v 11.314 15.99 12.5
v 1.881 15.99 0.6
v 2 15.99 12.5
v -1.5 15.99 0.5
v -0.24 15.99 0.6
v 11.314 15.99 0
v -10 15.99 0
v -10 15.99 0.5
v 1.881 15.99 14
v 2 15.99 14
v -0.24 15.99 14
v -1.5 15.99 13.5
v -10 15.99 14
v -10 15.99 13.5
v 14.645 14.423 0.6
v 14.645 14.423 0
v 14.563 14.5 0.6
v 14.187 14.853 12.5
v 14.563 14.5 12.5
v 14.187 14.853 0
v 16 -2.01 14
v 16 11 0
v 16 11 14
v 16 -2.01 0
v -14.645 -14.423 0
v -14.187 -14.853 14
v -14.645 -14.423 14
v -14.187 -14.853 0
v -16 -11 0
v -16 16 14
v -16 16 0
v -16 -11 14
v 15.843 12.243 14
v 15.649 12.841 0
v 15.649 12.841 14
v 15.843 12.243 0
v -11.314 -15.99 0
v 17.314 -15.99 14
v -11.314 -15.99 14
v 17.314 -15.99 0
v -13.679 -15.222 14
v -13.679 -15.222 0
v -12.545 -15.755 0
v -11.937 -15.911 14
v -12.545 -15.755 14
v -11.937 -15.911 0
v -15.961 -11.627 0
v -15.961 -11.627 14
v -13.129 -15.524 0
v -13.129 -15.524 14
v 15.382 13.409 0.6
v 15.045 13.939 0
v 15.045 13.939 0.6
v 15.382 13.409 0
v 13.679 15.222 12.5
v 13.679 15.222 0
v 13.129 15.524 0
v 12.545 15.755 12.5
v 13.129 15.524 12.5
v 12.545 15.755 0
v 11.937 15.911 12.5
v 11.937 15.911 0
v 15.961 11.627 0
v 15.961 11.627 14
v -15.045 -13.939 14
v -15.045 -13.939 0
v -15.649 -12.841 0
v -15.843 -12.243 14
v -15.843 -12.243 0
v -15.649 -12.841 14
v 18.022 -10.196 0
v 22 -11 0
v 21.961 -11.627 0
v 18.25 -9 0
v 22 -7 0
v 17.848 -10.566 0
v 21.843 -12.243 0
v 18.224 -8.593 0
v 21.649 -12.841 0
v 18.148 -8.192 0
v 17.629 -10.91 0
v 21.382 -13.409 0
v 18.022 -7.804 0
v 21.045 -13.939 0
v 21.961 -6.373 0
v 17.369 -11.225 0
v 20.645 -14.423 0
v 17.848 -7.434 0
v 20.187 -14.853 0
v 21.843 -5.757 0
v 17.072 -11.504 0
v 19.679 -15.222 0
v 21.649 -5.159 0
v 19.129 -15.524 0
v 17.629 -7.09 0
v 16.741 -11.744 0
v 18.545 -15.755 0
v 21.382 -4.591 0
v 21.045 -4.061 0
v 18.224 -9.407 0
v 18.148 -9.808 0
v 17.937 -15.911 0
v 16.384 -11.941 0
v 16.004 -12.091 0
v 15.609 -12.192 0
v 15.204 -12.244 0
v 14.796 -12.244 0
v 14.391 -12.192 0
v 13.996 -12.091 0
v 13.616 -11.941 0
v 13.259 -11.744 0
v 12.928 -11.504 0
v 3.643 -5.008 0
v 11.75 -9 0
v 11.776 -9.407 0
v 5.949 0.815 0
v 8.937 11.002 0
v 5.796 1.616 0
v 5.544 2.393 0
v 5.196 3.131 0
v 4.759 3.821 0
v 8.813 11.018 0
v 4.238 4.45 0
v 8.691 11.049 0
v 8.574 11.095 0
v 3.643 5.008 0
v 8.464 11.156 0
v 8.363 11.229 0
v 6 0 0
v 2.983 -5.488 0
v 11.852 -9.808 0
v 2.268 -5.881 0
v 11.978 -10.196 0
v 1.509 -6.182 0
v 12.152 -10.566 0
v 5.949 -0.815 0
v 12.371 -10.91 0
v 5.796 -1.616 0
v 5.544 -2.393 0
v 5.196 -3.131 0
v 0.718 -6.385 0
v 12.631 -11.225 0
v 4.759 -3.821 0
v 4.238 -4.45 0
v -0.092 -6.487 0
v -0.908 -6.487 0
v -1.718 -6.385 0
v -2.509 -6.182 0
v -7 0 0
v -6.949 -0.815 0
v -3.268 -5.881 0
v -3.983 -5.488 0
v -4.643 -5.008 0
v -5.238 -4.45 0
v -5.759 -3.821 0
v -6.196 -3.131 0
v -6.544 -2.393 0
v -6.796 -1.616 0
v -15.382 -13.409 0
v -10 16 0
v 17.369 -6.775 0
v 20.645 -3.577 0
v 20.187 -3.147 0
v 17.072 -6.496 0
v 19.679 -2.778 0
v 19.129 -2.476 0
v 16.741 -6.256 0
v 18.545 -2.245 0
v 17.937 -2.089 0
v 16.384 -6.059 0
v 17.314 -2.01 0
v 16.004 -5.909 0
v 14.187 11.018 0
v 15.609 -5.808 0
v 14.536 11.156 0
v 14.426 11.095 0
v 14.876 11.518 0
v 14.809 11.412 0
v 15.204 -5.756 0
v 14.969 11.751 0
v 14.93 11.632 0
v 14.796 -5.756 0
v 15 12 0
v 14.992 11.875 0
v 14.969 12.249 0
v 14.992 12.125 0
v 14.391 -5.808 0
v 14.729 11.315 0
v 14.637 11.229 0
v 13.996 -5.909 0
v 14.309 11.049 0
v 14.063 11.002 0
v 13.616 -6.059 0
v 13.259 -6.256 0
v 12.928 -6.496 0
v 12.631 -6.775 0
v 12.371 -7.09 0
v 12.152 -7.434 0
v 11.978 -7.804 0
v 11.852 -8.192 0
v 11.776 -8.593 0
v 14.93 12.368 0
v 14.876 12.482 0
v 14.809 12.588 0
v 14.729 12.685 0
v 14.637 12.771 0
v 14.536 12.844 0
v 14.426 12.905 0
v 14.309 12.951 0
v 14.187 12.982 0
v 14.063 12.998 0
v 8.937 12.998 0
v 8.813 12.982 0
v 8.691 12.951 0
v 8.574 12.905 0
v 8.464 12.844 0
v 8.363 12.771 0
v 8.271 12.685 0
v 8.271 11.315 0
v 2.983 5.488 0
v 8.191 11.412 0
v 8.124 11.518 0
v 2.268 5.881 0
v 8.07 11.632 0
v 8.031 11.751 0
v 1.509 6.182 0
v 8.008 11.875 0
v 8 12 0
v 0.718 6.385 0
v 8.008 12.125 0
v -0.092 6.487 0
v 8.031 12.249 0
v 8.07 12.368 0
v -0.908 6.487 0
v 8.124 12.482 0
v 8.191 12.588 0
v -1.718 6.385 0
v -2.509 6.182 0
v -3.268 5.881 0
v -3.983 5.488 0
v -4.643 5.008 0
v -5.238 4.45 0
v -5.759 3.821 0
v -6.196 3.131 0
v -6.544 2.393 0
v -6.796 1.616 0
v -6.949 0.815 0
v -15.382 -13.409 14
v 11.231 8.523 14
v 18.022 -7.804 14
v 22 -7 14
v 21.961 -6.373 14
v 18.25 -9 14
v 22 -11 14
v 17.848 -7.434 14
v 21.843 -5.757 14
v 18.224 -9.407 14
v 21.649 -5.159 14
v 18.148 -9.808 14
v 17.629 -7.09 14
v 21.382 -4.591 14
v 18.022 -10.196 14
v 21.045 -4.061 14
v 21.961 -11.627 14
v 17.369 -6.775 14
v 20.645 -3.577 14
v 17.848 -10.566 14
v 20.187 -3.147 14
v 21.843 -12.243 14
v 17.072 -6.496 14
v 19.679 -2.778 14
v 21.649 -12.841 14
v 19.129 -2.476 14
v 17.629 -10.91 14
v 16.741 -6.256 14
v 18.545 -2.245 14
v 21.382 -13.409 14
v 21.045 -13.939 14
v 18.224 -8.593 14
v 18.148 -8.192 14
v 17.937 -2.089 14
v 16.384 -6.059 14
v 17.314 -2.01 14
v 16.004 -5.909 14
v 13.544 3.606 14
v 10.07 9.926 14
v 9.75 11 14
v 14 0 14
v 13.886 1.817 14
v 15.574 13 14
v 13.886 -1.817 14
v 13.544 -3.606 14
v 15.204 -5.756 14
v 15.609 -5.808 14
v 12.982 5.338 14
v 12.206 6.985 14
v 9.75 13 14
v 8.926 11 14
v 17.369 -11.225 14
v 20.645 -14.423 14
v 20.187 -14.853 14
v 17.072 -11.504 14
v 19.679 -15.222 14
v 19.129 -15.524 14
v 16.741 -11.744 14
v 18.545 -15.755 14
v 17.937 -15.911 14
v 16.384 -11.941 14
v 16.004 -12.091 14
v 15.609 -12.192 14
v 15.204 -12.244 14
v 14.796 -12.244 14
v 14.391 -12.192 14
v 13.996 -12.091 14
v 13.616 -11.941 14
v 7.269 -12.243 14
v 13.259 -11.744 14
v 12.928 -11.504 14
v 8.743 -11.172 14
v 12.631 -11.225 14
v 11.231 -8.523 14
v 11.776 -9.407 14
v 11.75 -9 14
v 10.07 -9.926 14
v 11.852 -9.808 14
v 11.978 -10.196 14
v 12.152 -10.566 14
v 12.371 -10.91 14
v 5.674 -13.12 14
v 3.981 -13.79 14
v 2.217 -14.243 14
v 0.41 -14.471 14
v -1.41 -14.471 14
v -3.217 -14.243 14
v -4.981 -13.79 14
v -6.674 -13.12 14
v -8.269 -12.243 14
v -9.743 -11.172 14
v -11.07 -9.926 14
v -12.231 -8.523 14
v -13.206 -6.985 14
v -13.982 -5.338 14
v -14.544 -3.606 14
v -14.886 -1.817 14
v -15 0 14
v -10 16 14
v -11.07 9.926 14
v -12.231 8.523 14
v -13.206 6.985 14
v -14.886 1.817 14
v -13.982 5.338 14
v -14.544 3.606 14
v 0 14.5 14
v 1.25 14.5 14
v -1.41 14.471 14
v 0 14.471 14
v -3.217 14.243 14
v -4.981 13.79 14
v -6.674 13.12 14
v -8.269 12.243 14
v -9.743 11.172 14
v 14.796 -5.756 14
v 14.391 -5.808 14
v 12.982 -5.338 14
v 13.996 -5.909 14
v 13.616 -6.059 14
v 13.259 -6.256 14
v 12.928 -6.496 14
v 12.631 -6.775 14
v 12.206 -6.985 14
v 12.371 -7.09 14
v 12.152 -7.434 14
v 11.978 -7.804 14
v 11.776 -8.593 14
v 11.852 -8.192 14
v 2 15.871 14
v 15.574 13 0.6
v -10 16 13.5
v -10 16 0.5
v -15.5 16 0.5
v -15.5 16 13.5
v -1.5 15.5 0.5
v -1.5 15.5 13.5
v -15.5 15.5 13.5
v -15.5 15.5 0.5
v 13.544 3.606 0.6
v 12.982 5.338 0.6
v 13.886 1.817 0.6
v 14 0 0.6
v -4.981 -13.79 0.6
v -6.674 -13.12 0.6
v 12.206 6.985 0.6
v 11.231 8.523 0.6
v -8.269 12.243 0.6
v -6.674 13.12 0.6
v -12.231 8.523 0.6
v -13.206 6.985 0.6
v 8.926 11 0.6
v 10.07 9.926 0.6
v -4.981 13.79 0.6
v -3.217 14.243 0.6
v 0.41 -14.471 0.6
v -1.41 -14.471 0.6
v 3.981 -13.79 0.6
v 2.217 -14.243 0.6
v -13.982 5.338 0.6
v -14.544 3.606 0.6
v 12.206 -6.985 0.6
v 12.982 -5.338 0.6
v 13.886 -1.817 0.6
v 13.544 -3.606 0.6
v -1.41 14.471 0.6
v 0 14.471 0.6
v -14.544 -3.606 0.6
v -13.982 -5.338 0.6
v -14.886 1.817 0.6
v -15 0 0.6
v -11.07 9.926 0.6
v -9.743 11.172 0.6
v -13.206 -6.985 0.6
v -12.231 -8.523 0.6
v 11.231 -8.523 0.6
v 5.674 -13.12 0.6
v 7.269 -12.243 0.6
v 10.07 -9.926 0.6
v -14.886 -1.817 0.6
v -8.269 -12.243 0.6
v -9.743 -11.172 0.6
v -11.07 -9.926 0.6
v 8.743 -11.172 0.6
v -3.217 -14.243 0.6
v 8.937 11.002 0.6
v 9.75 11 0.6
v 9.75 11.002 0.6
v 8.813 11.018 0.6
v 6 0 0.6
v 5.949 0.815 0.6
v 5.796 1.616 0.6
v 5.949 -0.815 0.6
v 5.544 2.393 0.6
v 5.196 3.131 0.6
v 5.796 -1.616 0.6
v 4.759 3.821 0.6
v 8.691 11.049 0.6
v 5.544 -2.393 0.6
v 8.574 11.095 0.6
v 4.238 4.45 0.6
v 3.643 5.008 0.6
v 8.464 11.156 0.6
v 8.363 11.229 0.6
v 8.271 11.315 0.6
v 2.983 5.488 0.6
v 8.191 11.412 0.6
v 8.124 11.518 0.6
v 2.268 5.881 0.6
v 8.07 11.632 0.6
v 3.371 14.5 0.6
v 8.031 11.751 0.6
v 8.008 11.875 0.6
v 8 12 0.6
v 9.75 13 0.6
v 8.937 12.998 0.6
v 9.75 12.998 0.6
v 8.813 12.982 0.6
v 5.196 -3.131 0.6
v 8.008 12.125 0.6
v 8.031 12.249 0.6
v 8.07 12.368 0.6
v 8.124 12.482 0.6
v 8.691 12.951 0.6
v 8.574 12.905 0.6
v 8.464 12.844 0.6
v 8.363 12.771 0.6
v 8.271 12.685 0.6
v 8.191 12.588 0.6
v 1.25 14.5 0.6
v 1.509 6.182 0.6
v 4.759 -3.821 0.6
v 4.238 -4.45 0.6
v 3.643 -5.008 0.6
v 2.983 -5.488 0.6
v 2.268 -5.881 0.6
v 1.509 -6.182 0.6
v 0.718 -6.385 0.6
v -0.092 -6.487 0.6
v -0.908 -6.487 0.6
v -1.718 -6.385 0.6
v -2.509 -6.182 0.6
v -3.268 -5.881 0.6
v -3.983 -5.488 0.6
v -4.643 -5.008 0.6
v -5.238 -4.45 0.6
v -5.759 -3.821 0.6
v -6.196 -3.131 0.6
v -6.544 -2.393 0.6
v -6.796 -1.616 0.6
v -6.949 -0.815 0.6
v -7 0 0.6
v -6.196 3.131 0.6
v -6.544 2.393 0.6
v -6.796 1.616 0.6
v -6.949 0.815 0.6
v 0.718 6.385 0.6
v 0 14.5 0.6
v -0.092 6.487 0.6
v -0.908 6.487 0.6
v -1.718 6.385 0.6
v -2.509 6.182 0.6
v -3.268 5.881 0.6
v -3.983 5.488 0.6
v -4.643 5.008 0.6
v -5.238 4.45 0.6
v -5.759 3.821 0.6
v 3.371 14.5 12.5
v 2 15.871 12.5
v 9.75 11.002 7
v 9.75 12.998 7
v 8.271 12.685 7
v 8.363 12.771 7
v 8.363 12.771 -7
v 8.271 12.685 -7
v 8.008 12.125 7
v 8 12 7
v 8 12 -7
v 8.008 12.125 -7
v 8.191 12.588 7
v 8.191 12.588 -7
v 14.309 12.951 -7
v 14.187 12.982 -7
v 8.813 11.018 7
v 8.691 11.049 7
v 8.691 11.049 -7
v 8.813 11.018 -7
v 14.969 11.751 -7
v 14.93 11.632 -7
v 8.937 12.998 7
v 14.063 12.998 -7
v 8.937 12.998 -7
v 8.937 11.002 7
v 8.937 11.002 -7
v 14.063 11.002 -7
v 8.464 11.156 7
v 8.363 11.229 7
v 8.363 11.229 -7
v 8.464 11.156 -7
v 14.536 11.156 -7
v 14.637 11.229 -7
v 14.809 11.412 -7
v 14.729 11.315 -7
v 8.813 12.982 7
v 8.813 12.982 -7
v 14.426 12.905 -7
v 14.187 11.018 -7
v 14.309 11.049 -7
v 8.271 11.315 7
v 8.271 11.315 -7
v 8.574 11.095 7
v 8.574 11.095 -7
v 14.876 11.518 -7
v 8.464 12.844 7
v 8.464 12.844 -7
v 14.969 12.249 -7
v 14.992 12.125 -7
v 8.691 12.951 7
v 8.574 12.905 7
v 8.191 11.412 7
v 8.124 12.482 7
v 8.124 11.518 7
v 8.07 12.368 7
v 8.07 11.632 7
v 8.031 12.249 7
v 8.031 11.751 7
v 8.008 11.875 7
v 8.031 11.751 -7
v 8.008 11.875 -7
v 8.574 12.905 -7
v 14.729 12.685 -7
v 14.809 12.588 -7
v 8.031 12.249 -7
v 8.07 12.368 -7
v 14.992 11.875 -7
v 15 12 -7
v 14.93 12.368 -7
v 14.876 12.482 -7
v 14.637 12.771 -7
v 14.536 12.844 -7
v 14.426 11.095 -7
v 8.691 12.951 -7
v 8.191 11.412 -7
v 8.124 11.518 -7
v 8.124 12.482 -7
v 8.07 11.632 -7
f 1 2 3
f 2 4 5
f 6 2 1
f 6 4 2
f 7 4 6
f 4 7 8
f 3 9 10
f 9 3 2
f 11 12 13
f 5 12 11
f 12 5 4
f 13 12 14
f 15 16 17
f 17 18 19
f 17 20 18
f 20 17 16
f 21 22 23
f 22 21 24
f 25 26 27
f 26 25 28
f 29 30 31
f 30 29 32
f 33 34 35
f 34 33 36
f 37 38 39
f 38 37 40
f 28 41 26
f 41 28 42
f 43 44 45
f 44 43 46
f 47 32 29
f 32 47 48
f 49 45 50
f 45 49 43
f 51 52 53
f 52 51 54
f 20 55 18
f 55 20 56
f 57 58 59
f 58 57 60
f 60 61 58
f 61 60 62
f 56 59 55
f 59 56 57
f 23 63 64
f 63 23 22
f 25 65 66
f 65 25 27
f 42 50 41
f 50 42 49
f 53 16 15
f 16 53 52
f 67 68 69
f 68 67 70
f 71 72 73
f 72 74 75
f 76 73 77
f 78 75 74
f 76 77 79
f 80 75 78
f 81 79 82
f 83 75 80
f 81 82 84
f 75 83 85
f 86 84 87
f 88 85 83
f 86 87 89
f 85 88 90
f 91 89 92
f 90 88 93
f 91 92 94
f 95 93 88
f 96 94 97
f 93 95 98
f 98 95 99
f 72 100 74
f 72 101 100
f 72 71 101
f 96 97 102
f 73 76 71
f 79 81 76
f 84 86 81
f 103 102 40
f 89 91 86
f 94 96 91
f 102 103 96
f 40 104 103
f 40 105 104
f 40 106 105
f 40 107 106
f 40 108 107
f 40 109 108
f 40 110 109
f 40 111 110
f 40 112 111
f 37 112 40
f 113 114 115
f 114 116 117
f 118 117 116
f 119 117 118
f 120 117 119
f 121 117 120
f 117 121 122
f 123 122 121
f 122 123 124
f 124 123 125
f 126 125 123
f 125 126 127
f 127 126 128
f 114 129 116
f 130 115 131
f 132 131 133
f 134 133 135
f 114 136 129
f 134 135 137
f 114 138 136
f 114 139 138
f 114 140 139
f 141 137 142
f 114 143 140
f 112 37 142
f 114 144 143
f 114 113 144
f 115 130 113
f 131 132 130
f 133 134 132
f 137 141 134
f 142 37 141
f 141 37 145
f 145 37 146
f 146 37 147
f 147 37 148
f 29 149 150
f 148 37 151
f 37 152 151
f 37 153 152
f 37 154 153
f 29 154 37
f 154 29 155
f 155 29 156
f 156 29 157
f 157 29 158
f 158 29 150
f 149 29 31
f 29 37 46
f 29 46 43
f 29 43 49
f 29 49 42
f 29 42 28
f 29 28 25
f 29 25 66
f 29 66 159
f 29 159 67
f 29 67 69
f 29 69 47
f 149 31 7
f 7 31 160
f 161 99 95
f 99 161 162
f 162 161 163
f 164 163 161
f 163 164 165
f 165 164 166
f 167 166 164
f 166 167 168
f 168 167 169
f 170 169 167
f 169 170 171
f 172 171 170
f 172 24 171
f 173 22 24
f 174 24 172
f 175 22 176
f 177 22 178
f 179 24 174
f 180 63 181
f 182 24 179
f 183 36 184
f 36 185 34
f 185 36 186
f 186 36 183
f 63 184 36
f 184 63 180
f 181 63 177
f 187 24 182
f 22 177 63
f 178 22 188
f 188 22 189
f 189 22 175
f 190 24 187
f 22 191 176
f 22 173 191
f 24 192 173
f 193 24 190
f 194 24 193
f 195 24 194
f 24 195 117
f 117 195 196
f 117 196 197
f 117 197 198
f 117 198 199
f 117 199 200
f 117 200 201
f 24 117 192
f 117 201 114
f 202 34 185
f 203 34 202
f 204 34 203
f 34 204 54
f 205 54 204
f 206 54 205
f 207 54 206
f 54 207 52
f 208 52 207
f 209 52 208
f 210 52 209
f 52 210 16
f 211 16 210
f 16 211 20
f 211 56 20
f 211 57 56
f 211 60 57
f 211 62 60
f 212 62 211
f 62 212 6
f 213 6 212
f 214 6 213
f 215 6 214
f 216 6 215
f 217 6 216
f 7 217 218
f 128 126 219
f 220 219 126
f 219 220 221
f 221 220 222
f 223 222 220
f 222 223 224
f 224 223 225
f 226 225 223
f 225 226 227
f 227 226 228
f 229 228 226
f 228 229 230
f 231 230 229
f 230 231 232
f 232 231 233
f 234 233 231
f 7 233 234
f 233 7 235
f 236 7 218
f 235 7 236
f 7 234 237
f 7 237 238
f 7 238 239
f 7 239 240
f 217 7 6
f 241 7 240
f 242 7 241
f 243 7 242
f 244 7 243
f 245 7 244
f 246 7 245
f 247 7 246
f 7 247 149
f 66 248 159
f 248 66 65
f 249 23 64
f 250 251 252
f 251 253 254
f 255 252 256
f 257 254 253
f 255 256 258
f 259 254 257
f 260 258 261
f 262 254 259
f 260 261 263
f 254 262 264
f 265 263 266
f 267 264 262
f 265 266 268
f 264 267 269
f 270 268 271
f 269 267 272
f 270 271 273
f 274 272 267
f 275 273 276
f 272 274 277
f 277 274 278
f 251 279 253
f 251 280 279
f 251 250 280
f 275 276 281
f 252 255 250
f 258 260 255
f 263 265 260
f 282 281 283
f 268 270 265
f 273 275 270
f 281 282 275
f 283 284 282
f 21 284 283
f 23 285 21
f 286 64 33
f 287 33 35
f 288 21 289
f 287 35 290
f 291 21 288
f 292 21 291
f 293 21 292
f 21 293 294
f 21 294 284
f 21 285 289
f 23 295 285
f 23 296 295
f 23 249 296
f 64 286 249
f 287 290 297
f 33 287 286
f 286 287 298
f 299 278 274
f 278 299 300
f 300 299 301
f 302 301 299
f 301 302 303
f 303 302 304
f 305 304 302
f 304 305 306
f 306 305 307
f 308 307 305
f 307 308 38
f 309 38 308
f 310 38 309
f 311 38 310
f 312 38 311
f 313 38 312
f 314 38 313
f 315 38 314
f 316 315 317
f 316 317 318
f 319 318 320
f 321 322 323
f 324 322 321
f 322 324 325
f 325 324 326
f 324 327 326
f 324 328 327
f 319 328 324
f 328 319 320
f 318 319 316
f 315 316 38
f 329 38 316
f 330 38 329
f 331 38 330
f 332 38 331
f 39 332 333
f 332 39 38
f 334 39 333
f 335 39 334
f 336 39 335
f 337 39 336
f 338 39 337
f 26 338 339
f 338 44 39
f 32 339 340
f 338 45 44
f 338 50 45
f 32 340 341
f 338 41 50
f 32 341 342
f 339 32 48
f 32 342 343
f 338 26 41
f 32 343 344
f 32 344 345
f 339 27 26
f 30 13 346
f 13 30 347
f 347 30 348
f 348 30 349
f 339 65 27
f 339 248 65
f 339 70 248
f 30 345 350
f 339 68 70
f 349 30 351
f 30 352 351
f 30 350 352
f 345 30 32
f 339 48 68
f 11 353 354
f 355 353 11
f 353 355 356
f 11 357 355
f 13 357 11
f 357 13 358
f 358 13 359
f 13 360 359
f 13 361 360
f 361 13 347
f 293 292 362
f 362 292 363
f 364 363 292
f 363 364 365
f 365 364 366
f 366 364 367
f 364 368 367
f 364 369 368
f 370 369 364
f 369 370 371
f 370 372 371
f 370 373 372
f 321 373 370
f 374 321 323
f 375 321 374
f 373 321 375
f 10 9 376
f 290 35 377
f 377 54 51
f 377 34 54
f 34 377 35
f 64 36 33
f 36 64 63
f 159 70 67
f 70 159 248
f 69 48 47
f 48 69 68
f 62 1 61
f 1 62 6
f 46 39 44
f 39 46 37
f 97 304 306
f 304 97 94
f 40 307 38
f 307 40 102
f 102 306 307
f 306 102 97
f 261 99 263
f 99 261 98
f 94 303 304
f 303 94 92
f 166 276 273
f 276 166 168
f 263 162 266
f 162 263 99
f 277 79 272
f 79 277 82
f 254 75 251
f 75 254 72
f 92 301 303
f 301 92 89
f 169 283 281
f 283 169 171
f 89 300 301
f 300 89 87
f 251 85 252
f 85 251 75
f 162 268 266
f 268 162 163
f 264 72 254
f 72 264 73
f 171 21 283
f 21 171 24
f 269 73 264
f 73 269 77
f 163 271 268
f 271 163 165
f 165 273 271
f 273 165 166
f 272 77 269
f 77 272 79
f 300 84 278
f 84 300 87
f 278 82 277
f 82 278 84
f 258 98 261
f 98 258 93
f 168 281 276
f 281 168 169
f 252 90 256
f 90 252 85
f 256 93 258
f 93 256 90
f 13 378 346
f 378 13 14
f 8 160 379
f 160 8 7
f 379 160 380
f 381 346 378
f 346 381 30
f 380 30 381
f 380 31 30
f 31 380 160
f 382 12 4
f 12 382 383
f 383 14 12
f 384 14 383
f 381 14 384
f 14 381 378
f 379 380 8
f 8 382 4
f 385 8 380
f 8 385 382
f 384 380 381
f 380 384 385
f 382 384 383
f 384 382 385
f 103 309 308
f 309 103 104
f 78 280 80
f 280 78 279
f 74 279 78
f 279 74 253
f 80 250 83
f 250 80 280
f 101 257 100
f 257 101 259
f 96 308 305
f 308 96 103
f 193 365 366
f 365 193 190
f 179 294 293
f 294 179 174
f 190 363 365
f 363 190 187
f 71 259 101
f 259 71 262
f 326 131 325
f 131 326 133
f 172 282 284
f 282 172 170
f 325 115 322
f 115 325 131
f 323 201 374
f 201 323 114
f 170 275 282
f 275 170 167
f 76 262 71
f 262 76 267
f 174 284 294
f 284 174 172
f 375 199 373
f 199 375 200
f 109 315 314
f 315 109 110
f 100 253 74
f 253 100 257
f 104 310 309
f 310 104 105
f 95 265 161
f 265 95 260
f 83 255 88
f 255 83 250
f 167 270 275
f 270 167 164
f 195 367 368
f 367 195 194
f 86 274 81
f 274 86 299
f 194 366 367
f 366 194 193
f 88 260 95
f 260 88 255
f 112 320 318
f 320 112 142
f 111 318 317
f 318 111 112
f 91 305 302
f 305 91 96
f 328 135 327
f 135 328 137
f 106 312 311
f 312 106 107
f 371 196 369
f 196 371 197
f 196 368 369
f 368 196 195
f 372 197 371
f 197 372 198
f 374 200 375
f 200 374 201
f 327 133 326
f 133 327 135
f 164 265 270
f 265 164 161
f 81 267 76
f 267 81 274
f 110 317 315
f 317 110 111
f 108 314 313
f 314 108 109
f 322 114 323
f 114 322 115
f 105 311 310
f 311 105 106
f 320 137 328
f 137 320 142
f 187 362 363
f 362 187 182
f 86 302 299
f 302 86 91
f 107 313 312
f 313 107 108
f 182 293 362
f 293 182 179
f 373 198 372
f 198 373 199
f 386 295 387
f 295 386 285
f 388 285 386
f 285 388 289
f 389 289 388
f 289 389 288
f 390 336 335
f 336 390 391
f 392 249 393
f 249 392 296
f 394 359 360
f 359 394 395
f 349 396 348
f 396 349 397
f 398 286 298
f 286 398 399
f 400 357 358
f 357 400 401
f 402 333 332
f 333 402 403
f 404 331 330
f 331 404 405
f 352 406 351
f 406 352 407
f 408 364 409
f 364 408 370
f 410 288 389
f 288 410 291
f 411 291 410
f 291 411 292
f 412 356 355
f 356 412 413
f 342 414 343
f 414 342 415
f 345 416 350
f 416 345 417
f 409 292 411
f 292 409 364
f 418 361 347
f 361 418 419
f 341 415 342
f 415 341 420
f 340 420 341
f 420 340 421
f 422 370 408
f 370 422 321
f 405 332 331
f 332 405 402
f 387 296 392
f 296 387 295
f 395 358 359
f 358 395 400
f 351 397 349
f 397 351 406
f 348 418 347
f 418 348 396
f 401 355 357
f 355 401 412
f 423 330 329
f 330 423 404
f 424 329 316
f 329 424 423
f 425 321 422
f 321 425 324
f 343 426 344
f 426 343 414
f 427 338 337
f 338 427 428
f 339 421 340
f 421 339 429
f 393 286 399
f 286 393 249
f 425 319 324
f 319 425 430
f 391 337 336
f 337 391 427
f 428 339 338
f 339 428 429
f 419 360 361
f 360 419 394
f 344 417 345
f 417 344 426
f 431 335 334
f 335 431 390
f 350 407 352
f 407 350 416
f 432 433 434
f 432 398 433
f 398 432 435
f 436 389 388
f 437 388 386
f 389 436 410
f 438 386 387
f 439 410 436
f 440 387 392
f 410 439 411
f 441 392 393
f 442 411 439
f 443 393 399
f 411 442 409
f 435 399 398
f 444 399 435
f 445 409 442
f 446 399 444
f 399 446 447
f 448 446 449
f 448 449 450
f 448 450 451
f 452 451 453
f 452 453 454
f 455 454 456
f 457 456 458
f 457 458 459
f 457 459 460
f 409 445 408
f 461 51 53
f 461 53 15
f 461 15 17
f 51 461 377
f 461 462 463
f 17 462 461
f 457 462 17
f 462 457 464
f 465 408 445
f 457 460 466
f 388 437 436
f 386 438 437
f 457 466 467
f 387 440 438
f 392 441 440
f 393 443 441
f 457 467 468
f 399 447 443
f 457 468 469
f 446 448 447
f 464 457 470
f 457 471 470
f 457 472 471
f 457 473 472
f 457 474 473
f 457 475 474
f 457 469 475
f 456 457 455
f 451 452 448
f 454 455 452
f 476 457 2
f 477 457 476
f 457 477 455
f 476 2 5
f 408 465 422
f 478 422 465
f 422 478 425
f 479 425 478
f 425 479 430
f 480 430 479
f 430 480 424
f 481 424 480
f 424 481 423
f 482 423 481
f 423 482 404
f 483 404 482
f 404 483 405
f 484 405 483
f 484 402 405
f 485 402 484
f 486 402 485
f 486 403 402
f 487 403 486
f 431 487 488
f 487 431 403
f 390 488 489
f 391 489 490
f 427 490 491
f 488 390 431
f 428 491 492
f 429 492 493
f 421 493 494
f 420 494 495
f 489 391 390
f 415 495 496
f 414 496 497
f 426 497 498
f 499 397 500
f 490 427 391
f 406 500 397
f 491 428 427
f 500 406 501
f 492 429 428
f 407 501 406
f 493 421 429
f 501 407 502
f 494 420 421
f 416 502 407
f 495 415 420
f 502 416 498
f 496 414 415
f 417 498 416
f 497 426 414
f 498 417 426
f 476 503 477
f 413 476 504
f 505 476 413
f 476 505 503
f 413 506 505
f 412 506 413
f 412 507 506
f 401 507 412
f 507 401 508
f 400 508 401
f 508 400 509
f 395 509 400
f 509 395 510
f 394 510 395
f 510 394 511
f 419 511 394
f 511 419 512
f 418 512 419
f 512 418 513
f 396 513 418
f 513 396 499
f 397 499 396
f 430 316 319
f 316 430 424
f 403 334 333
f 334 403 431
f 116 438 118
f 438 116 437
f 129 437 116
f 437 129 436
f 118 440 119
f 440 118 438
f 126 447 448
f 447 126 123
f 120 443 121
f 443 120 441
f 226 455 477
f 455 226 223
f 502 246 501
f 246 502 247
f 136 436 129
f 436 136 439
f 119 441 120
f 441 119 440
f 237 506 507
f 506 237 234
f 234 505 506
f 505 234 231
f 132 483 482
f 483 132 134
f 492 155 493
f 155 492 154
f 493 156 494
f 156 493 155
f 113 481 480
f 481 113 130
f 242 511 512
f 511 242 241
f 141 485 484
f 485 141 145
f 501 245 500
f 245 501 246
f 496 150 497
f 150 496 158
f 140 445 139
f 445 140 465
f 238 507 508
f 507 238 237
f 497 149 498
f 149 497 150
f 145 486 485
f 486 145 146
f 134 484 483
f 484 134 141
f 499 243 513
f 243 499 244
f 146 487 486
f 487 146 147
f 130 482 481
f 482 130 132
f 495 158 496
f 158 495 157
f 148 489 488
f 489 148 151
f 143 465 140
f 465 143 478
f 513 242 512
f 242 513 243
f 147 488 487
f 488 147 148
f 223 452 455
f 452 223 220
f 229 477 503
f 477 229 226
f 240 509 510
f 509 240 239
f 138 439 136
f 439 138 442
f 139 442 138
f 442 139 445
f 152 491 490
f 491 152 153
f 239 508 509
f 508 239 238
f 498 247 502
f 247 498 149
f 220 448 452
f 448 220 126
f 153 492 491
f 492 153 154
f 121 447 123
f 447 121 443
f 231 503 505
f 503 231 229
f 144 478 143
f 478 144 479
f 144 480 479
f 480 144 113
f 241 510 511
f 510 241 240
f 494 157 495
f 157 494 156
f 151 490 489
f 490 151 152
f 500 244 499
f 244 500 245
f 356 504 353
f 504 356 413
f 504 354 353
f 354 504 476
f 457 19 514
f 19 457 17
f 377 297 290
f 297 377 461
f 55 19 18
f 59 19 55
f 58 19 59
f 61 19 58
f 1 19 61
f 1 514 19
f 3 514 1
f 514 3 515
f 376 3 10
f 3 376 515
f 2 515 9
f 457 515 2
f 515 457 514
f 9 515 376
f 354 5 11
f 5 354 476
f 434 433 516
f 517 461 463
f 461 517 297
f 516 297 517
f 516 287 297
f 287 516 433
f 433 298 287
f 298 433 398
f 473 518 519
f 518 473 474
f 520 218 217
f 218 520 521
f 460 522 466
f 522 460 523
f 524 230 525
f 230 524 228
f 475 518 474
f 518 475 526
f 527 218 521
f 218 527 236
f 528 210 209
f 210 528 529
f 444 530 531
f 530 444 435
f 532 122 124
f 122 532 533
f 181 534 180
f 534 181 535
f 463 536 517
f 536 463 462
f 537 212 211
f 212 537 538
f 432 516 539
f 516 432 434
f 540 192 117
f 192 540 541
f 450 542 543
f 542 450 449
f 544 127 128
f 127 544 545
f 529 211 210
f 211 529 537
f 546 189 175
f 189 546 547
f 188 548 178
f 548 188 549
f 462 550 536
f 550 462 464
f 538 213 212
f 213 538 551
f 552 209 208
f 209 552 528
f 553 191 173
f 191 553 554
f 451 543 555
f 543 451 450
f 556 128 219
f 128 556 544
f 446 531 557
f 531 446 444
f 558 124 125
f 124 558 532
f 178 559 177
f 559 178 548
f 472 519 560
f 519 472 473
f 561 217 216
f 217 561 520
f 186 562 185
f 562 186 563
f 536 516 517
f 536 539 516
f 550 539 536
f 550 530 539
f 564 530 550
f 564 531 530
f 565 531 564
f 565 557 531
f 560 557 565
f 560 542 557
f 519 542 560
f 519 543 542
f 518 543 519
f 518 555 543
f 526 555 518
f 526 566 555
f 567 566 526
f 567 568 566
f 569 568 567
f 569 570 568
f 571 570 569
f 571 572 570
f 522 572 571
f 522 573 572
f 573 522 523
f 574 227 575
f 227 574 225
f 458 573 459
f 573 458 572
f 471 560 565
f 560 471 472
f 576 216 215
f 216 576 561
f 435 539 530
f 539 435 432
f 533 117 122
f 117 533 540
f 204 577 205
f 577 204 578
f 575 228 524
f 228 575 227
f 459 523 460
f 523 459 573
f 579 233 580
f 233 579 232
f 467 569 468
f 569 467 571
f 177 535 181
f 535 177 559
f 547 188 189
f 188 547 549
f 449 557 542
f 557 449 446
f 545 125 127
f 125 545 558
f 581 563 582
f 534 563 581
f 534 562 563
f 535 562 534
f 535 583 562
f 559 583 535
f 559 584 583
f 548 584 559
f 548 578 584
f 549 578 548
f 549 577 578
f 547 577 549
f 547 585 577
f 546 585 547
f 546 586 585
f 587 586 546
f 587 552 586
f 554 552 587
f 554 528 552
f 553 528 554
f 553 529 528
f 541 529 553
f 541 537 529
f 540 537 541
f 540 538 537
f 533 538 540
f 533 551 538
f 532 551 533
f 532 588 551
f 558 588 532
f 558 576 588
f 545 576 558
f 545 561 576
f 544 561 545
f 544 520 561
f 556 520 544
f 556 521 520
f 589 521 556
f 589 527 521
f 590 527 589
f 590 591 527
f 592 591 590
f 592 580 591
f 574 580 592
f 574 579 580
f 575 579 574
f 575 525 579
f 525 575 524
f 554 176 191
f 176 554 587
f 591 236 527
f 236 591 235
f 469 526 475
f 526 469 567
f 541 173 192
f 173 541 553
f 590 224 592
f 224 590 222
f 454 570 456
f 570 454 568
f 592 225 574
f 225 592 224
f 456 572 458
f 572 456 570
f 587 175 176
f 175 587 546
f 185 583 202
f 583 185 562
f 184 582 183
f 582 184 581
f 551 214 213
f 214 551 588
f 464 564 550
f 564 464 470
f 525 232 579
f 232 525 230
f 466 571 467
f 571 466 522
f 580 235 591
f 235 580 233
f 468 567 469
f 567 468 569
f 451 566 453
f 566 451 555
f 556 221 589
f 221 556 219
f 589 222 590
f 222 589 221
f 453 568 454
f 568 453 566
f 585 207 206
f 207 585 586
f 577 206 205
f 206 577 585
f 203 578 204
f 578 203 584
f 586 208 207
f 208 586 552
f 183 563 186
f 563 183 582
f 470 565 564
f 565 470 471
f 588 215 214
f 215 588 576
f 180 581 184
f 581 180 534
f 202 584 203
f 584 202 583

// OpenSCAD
$fn = 50;


union() {
	difference() {
		union() {
			hull() {
				translate(v = [-11.0000000000, 11.0000000000, 0]) {
					cylinder(h = 14, r = 5);
				}
				translate(v = [11.0000000000, 11.0000000000, 0]) {
					cylinder(h = 14, r = 5);
				}
				translate(v = [-11.0000000000, -11.0000000000, 0]) {
					cylinder(h = 14, r = 5);
				}
				translate(v = [11.0000000000, -11.0000000000, 0]) {
					cylinder(h = 14, r = 5);
				}
			}
			translate(v = [7.5000000000, -9.0000000000, 0]) {
				hull() {
					translate(v = [-9.5000000000, 2.0000000000, 0]) {
						cylinder(h = 14, r = 5);
					}
					translate(v = [9.5000000000, 2.0000000000, 0]) {
						cylinder(h = 14, r = 5);
					}
					translate(v = [-9.5000000000, -2.0000000000, 0]) {
						cylinder(h = 14, r = 5);
					}
					translate(v = [9.5000000000, -2.0000000000, 0]) {
						cylinder(h = 14, r = 5);
					}
				}
			}
			translate(v = [-16.0000000000, 10.0000000000, 0]) {
				cube(size = [6, 6, 14]);
			}
		}
		union() {
			translate(v = [-15.5000000000, 15.5000000000, 0.5000000000]) {
				cube(size = [14, 0.5000000000, 13.0000000000]);
			}
			translate(v = [15.0000000000, -9.0000000000, -100.0000000000]) {
				cylinder(h = 200, r = 3.2500000000);
			}
			translate(v = [-0.5000000000, 0.0000000000, 0.6000000000]) {
				cylinder(h = 16.4000000000, r = 14.5000000000);
			}
			translate(v = [-0.5000000000, 0.0000000000, -7.0000000000]) {
				cylinder(h = 14, r = 6.5000000000);
			}
			translate(v = [0.0000000000, 13.0000000000, 0.6000000000]) {
				cube(size = [16.0000000000, 1.5000000000, 16.4000000000]);
			}
			translate(v = [2.0000000000, 13.0000000000, 12.5000000000]) {
				cube(size = [14.0000000000, 4.5000000000, 1.5000000000]);
			}
			translate(v = [-3.0000000000, 18.7500000000, 0.6000000000]) {
				rotate(a = [0, 0, -45]) {
					cube(size = [10, 1.5000000000, 16.4000000000]);
				}
			}
			translate(v = [2.2500000000, 11.0000000000, 0.6000000000]) {
				cube(size = [7.5000000000, 2, 13.4000000000]);
			}
		}
	}
	union() {
		translate(v = [11.5000000000, 12, -7.0000000000]) {
			rotate(a = [0, 0, 0]) {
				difference() {
					union() {
						hull() {
							translate(v = [2.5000000000, 0, 0]) {
								cylinder(h = 14, r = 1.0000000000, r1 = 1.0000000000, r2 = 1.0000000000);
							}
							translate(v = [-2.5000000000, 0, 0]) {
								cylinder(h = 14, r = 1.0000000000, r1 = 1.0000000000, r2 = 1.0000000000);
							}
						}
					}
					union();
				}
			}
		}
	}
}
